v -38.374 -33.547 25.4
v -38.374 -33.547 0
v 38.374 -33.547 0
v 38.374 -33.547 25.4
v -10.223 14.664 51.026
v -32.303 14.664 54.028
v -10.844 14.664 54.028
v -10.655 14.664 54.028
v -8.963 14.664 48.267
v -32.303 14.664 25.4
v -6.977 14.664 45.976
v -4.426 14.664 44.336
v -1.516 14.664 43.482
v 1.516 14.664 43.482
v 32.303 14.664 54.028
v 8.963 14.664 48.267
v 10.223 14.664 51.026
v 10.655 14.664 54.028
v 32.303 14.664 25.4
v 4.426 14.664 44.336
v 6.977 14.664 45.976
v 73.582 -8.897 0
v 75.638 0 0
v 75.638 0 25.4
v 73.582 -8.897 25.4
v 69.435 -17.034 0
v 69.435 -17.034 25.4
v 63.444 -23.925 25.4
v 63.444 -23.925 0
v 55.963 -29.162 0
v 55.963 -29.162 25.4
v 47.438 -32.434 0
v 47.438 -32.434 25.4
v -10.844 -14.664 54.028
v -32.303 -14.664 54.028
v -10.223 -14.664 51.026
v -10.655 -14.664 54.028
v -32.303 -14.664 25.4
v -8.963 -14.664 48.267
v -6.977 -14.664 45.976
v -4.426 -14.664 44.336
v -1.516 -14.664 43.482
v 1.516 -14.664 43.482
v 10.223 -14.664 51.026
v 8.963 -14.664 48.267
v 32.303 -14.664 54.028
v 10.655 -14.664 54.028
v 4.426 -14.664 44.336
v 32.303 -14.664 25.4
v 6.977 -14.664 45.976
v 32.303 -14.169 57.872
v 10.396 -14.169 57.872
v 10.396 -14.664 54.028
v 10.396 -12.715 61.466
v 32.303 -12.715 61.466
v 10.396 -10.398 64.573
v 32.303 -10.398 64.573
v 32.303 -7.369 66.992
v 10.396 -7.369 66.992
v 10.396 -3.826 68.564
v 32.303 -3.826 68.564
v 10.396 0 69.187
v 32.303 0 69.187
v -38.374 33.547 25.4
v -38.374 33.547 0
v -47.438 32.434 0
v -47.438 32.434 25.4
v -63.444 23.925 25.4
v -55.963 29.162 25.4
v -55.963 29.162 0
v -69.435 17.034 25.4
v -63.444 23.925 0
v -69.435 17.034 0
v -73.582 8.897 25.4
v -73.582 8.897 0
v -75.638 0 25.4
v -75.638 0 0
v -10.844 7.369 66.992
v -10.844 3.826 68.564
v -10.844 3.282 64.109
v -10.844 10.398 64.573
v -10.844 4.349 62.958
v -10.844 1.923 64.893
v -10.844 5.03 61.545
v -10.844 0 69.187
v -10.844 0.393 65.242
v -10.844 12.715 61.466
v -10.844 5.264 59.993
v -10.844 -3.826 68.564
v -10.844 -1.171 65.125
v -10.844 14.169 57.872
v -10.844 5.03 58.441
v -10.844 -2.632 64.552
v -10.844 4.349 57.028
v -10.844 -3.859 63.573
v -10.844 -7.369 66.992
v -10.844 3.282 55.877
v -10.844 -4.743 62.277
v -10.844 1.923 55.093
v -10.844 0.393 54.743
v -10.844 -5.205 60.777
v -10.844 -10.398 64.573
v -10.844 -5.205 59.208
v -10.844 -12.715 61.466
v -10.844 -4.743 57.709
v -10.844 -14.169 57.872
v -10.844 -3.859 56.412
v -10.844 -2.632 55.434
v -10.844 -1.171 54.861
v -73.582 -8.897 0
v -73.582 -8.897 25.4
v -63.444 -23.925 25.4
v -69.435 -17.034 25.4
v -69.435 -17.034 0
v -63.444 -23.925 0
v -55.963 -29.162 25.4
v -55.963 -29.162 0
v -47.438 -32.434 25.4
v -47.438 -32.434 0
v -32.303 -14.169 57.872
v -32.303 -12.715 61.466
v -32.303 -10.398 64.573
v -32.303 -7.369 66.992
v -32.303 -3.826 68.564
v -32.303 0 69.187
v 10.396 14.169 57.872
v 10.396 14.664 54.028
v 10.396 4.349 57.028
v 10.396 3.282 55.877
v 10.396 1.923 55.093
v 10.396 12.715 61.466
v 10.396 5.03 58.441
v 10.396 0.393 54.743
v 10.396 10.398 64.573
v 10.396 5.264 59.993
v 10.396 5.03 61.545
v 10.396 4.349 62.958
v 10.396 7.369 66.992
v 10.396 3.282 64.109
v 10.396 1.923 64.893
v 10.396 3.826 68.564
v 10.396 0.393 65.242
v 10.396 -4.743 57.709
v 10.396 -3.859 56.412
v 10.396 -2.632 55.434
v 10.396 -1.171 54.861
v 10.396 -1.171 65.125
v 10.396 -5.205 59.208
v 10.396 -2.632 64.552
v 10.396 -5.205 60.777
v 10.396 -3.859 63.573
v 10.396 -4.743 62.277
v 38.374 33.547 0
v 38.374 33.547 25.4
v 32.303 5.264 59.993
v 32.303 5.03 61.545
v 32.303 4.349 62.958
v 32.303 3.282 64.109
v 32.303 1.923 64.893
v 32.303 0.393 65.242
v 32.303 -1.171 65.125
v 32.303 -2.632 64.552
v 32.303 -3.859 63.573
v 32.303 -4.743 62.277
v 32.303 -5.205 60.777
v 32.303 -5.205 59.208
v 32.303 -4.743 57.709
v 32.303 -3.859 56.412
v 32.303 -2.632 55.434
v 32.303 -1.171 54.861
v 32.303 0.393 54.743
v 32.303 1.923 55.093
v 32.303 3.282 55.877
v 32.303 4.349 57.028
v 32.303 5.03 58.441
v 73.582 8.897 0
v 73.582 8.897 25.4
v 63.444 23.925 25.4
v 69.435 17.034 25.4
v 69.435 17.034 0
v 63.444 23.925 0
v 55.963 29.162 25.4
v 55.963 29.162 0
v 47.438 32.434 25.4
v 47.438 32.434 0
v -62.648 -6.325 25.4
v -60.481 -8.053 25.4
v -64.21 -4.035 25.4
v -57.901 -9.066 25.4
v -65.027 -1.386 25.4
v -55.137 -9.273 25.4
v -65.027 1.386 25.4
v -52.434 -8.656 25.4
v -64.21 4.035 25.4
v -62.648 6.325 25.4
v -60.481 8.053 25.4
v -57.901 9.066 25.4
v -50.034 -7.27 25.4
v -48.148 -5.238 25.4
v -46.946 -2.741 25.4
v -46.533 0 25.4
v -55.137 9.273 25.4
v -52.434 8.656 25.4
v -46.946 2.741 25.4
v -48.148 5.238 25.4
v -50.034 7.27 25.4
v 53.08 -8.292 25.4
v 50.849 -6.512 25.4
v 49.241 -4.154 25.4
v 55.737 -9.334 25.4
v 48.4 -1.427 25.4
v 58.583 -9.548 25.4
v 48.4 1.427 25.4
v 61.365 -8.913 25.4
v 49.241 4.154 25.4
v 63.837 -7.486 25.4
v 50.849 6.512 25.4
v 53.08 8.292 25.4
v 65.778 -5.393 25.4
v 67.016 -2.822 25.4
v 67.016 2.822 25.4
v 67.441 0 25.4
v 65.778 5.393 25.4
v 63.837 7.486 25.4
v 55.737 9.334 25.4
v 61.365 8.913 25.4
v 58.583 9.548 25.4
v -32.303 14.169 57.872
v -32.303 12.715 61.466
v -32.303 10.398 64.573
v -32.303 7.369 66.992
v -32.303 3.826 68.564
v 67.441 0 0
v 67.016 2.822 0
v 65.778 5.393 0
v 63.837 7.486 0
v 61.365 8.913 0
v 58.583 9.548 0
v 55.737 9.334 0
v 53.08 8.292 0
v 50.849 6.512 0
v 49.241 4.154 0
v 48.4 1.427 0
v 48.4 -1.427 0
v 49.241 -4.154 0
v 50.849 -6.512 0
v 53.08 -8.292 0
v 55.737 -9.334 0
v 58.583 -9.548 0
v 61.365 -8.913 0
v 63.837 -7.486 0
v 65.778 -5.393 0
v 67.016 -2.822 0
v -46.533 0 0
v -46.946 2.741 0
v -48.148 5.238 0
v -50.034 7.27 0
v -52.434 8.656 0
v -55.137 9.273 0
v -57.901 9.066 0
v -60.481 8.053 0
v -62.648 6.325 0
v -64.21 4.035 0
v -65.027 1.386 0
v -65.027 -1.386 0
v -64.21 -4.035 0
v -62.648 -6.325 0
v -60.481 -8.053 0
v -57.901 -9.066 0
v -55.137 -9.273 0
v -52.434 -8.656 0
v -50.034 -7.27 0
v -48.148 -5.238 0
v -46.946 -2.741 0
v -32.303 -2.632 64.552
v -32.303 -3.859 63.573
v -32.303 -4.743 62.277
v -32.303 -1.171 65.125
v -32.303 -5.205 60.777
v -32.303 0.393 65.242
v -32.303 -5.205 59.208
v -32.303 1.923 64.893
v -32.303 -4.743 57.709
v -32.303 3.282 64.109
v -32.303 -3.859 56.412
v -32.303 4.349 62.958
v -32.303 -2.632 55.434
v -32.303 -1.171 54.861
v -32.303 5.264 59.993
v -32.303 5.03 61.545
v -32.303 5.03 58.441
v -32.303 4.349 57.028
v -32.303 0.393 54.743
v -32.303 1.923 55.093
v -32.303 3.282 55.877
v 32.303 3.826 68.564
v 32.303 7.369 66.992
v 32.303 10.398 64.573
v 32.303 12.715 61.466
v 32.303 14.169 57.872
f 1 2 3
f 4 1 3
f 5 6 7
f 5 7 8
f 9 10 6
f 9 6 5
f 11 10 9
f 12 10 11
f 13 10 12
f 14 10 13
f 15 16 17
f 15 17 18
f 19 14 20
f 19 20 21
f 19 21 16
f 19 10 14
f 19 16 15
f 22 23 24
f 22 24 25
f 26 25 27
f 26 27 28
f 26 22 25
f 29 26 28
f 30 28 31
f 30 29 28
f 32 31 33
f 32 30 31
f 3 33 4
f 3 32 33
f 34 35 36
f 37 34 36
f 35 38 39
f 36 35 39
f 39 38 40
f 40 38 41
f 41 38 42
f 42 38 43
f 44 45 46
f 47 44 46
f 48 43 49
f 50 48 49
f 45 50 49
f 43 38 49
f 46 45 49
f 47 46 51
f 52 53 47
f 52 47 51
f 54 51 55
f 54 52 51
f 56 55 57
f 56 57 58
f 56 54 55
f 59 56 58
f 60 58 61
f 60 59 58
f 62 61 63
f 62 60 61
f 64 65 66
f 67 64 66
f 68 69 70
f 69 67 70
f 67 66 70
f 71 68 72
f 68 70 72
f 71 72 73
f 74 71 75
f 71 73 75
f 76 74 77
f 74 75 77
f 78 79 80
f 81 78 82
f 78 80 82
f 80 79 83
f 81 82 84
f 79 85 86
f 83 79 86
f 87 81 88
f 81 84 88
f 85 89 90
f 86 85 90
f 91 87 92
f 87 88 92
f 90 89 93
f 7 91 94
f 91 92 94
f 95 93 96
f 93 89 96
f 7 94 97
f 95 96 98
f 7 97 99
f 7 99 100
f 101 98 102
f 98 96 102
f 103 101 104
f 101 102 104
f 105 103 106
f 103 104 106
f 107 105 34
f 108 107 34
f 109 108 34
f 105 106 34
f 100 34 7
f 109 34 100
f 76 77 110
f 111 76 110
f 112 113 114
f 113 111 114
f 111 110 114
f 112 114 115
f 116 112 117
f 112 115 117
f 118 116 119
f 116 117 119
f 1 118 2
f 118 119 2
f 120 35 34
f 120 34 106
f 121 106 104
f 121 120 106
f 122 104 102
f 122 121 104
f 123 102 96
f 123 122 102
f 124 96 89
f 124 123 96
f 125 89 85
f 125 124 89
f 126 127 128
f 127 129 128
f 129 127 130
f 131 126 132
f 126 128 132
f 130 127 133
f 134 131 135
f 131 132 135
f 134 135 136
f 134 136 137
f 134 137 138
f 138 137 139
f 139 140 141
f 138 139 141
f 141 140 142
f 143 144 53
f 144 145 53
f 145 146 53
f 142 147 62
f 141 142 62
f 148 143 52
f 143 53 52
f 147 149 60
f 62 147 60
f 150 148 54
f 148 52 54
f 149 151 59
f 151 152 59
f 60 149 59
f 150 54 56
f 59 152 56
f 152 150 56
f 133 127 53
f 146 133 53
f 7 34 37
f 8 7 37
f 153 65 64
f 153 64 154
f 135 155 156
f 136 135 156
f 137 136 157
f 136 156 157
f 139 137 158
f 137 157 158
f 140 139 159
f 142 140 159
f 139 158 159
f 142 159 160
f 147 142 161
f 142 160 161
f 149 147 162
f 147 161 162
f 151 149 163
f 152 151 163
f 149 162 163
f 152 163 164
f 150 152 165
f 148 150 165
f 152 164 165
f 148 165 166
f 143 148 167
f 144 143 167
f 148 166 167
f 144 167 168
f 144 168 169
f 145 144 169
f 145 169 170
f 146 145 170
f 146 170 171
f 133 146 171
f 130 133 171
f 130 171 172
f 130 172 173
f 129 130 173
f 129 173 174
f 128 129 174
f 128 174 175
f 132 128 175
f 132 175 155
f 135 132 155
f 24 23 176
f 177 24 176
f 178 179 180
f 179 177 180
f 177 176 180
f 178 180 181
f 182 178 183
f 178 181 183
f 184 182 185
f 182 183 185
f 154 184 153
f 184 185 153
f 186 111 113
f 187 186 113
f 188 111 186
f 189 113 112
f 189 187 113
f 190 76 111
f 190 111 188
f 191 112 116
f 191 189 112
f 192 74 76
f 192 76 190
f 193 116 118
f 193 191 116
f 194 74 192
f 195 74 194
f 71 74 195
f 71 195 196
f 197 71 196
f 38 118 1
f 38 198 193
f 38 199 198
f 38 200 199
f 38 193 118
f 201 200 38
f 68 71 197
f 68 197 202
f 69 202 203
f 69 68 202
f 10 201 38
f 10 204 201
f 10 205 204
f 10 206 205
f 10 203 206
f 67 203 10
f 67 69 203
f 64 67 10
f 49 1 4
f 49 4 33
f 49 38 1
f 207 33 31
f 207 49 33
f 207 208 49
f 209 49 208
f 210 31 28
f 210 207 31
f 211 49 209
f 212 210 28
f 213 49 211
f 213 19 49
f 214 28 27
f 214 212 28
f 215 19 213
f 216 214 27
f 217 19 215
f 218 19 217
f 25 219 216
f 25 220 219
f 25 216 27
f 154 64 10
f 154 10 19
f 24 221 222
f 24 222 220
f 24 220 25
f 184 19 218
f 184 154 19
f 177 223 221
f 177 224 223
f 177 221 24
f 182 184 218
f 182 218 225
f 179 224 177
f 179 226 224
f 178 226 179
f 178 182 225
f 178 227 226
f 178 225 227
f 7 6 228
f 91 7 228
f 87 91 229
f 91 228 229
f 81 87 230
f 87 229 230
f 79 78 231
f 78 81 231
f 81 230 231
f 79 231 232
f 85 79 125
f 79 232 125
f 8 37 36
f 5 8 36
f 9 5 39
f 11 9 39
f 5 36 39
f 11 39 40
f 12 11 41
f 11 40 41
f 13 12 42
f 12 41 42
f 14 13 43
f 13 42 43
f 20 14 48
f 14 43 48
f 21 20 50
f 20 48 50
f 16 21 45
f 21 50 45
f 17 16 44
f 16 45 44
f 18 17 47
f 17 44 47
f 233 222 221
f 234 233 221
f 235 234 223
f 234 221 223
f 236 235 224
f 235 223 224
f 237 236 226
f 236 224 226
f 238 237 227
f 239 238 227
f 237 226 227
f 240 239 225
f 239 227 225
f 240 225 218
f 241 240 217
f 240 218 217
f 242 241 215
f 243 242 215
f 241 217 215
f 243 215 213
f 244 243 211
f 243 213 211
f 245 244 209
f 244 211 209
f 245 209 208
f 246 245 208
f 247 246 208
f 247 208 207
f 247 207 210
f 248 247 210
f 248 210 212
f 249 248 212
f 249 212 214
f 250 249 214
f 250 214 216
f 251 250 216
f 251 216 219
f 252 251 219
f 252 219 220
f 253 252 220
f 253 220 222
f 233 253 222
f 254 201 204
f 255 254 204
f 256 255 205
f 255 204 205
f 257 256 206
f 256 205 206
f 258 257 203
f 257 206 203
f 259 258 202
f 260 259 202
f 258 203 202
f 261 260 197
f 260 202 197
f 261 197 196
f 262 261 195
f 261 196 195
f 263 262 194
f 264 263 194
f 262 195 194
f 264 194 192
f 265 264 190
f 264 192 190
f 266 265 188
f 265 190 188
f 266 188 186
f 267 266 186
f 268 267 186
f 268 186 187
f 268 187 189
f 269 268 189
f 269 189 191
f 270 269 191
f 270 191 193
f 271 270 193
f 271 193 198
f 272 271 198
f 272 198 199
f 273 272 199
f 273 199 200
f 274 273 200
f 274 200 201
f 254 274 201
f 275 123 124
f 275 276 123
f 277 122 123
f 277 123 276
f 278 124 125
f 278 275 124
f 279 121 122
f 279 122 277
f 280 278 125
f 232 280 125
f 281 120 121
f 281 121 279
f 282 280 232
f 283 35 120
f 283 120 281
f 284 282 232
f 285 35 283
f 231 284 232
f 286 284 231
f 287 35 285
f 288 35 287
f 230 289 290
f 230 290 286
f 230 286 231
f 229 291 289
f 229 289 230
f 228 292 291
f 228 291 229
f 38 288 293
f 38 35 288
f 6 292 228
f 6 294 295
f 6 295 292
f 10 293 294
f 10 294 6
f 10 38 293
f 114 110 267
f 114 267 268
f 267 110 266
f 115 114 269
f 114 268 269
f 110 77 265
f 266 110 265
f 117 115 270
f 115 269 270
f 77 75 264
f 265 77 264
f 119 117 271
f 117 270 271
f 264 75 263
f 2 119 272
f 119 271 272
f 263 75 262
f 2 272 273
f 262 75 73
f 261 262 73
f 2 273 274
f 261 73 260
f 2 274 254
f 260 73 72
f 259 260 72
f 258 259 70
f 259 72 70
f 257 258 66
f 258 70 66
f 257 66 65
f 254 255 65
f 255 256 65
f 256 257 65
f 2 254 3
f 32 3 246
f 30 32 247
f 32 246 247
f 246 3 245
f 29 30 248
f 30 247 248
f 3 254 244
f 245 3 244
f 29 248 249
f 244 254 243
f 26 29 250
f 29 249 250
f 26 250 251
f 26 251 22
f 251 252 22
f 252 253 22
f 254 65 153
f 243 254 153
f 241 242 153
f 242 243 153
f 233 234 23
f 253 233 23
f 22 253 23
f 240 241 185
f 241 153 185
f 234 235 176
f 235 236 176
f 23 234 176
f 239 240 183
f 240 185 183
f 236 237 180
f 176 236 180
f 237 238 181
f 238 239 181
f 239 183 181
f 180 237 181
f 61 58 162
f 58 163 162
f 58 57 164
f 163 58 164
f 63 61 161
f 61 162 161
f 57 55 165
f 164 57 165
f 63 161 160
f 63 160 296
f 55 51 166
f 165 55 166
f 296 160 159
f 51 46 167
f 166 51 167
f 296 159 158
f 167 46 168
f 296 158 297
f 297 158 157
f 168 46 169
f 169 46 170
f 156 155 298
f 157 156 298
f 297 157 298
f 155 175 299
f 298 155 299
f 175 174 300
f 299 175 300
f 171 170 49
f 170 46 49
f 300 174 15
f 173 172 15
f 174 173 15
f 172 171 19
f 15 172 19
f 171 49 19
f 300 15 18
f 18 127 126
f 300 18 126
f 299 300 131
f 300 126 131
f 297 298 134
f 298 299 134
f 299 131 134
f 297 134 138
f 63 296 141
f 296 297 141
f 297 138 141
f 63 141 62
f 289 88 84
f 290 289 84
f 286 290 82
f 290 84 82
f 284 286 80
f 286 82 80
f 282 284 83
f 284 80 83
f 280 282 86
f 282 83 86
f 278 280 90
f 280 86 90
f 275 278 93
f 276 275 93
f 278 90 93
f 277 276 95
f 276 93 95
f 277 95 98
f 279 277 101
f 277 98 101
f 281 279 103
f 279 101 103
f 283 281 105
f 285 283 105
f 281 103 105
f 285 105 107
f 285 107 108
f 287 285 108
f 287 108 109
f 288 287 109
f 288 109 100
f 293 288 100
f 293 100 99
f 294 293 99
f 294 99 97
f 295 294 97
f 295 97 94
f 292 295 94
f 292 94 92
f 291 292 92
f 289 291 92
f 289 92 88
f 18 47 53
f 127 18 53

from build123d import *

# Parameters (mm, degrees)
F0_W         = 151.6868472099
F0_H         = 67.0943334699
F1_DEPTH     = 25.4
F9_T1_DEPTH  = 212.7476366747
F2_R         = 9.5743665409
F2_R_2       = 9.2989273841
F3_DEPTH     = 25.401
F4_W         = 64.6063834429
F4_H         = 29.3284505606
F10_DEPTH    = 43.7951106578
F11_T1_DEPTH = 140.443628516
F5_R         = 5.2641428602
F6_DEPTH     = 107.9417508016
F8_DEPTH     = 48.2123920152


# Not quite as in the source:
# - a fillet or chamfer that OpenCascade refuses, or shapes differently, is made with other operations: its cross-section is extruded or revolved along the edge and cut away or added


with BuildPart() as f1:
    # F0 (on Top) → F1 (new body)
    with BuildSketch(Plane.XY):
        Rectangle(F0_W, F0_H)
    extrude(amount=F1_DEPTH)

    # F9: fillet of radius 37.4695273349 on 4 edges, made by hand

    # F9_s2 → F9_t1 (cut)
    with BuildSketch(Plane.XY.offset(-93.6738183373)):
        with BuildLine():
            ThreePointArc((75.843423605, -3.9223606), (64.8688531364, 22.5725962664), (38.37389627, 33.5471667349))
            Line((38.37389627, 33.5471667349), (75.843423605, 33.5471667349))
            Line((75.843423605, 33.5471667349), (75.843423605, -3.9223606))
        make_face()
        with BuildLine():
            ThreePointArc((75.843423605, 3.9223606), (64.8688531364, -22.5725962664), (38.37389627, -33.5471667349))
            Line((38.37389627, -33.5471667349), (75.843423605, -33.5471667349))
            Line((75.843423605, -33.5471667349), (75.843423605, 3.9223606))
        make_face()
        with BuildLine():
            ThreePointArc((-75.843423605, 3.9223606), (-64.8688531364, -22.5725962664), (-38.37389627, -33.5471667349))
            Line((-38.37389627, -33.5471667349), (-75.843423605, -33.5471667349))
            Line((-75.843423605, -33.5471667349), (-75.843423605, 3.9223606))
        make_face()
        with BuildLine():
            ThreePointArc((-38.37389627, 33.5471667349), (-64.8688531364, 22.5725962664), (-75.843423605, -3.9223606))
            Line((-75.843423605, -3.9223606), (-75.843423605, 33.5471667349))
            Line((-75.843423605, 33.5471667349), (-38.37389627, 33.5471667349))
        make_face()
    extrude(amount=F9_T1_DEPTH, mode=Mode.SUBTRACT)

    # F2 (on face) → F3 (cut, through all)
    with BuildSketch(Plane.XY.offset(25.4)):
        with Locations((57.8670687973, 0)):
            Circle(F2_R)
        with Locations((-55.8316037059, 0)):
            Circle(F2_R_2)
    extrude(amount=-F3_DEPTH, mode=Mode.SUBTRACT)

    # F4 (on face) → F10 (join)
    with BuildSketch(Plane.XY.offset(25.4)):
        Rectangle(F4_W, F4_H)
    extrude(amount=F10_DEPTH)

    # F11: fillet of radius 15.1674490146 on 2 edges, made by hand

    # F11_s2 → F11_t1 (cut)
    with BuildSketch(Plane.YZ.offset(-70.221814258)):
        with BuildLine():
            ThreePointArc((-14.6642252803, 54.0276616432), (-10.2217823172, 64.7526676947), (0.5032237343, 69.1951106578))
            Line((0.5032237343, 69.1951106578), (-14.6642252803, 69.1951106578))
            Line((-14.6642252803, 69.1951106578), (-14.6642252803, 54.0276616432))
        make_face()
        with BuildLine():
            ThreePointArc((14.6642252803, 54.0276616432), (10.2217823172, 64.7526676947), (-0.5032237343, 69.1951106578))
            Line((-0.5032237343, 69.1951106578), (14.6642252803, 69.1951106578))
            Line((14.6642252803, 69.1951106578), (14.6642252803, 54.0276616432))
        make_face()
    extrude(amount=F11_T1_DEPTH, mode=Mode.SUBTRACT)

    # F5 (on face) → F6 (cut, through all)
    with BuildSketch(Plane.YZ.offset(32.3031917214)):
        with Locations((0, 59.9929094315)):
            Circle(F5_R)
    extrude(amount=-F6_DEPTH, mode=Mode.SUBTRACT)

    # F7 (on face) → F8 (cut, through all)
    with BuildSketch(Plane.XZ.offset(14.6642252803)):
        with BuildLine():
            Line((-10.8441319317, 74.8410969973), (-10.8441319317, 54.0276616432))
            Line((-10.8441319317, 54.0276616432), (-10.6545253, 54.0276616432))
            ThreePointArc((-10.6545253, 54.0276616432), (-1.1741893399, 64.6172881126), (10.3957206011, 56.3617358819))
            Line((10.3957206011, 56.3617358819), (10.3957206011, 74.8410969973))
            Line((10.3957206011, 74.8410969973), (-10.8441319317, 74.8410969973))
        make_face()
        with BuildLine():
            ThreePointArc((10.3957206011, 56.3617358819), (-1.1741893399, 64.6172881126), (-10.6545253, 54.0276616432))
            Line((-10.6545253, 54.0276616432), (10.3957206011, 54.0276616432))
            Line((10.3957206011, 54.0276616432), (10.3957206011, 56.3617358819))
        make_face()
        with BuildLine():
            Line((10.3957206011, 54.0276616432), (-10.6545253, 54.0276616432))
            ThreePointArc((-10.6545253, 54.0276616432), (0, 43.3731363432), (10.6545253, 54.0276616432))
            Line((10.6545253, 54.0276616432), (10.3957206011, 54.0276616432))
        make_face()
    extrude(amount=-F8_DEPTH, mode=Mode.SUBTRACT)


solid = f1.part
